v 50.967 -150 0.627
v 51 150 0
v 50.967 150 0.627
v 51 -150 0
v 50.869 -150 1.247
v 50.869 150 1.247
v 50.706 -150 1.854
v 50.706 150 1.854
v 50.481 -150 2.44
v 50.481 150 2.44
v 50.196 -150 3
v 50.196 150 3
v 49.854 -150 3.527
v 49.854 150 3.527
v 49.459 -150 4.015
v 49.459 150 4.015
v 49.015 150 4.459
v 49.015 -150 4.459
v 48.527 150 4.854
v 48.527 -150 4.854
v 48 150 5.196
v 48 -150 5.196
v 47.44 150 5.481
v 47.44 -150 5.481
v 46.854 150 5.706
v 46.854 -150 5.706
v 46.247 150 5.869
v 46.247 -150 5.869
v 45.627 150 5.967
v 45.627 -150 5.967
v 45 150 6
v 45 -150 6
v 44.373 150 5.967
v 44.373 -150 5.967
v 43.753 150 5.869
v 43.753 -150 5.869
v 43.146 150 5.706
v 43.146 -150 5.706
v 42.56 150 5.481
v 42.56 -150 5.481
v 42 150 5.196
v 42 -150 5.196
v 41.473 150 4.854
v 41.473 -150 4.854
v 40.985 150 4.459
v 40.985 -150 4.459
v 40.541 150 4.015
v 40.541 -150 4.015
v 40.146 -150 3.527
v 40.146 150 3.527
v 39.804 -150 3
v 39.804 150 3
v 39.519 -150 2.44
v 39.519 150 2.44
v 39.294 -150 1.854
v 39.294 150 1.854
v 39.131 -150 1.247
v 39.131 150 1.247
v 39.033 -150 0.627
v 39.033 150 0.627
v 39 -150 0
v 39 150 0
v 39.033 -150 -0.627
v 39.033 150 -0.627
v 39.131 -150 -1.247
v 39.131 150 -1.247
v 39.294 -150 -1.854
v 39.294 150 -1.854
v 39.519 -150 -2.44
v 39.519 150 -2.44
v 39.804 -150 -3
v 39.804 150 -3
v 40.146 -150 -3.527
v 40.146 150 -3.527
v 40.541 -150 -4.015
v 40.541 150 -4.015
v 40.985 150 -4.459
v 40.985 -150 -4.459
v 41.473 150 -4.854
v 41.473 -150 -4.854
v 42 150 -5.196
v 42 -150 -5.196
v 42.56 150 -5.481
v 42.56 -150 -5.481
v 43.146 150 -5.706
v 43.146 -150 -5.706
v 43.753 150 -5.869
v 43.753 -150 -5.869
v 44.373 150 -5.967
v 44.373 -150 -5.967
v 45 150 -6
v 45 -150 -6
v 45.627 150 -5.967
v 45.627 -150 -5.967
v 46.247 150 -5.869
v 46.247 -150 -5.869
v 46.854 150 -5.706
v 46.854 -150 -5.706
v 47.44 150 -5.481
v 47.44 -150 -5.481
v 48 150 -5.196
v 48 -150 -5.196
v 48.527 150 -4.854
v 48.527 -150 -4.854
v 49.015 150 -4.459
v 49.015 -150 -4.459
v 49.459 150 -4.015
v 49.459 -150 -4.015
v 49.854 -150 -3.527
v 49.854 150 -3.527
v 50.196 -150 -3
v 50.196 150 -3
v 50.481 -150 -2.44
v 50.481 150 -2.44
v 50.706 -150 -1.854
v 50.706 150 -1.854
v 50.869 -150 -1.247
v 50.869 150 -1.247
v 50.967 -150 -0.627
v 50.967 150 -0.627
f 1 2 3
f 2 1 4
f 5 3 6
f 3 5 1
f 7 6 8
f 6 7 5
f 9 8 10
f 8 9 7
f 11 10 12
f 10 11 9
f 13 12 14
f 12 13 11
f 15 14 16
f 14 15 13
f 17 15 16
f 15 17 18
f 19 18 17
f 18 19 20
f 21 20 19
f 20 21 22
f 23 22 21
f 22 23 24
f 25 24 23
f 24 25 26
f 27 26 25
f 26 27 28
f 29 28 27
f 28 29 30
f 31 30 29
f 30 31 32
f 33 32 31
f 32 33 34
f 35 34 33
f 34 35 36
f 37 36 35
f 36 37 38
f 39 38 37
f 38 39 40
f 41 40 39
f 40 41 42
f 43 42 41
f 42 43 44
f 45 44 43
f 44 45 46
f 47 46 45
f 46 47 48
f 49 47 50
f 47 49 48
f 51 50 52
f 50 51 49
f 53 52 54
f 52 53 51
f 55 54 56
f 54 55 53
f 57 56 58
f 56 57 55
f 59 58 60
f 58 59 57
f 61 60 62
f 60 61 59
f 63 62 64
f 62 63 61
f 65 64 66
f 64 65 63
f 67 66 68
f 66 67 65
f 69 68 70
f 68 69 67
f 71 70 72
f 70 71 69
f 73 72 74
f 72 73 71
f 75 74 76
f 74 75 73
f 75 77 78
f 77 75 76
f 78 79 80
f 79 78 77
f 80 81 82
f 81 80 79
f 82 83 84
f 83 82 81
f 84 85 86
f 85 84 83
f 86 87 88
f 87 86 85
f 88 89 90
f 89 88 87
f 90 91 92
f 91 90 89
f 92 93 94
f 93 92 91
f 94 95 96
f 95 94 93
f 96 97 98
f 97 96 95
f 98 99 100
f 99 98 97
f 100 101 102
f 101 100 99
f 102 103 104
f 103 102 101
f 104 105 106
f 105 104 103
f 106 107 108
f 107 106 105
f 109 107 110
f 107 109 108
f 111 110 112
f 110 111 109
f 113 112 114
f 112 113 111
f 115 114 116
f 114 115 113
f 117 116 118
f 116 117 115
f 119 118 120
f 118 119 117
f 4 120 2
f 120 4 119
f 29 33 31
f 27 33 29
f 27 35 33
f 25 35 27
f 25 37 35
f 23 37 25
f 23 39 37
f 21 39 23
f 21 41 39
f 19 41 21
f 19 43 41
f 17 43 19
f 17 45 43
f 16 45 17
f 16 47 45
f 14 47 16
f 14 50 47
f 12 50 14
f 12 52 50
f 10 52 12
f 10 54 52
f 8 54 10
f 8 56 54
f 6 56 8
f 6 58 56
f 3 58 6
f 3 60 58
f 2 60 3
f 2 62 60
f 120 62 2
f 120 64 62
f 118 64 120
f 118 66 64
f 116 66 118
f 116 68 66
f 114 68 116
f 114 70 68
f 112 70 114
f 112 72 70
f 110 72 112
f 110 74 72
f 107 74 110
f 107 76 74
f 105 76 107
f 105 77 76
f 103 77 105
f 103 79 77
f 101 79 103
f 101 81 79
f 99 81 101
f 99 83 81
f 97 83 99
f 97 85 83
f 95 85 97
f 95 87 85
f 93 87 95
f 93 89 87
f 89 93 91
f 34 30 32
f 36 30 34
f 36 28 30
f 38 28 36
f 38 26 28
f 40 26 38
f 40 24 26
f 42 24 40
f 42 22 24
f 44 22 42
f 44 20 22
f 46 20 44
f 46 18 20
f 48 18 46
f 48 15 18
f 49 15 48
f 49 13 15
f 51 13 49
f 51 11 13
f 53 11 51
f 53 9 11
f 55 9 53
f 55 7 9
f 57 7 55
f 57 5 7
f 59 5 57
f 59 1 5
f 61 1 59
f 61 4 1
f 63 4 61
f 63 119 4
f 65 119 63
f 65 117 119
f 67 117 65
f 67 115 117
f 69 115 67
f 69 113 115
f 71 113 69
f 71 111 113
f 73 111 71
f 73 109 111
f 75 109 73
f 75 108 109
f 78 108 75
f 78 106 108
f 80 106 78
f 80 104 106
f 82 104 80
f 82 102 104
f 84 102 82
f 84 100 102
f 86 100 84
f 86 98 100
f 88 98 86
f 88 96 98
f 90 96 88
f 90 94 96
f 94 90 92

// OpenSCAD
THREADED_R = 12 / 2;
ROD_R = 13 / 2;

module threaded_rod () {
    $fn = 60;
    length = 30 * 10;
    cylinder(r = THREADED_R, h = length, center = true);
}

translate([45, 0, 0]) rotate([90, 0, 0]) threaded_rod();
